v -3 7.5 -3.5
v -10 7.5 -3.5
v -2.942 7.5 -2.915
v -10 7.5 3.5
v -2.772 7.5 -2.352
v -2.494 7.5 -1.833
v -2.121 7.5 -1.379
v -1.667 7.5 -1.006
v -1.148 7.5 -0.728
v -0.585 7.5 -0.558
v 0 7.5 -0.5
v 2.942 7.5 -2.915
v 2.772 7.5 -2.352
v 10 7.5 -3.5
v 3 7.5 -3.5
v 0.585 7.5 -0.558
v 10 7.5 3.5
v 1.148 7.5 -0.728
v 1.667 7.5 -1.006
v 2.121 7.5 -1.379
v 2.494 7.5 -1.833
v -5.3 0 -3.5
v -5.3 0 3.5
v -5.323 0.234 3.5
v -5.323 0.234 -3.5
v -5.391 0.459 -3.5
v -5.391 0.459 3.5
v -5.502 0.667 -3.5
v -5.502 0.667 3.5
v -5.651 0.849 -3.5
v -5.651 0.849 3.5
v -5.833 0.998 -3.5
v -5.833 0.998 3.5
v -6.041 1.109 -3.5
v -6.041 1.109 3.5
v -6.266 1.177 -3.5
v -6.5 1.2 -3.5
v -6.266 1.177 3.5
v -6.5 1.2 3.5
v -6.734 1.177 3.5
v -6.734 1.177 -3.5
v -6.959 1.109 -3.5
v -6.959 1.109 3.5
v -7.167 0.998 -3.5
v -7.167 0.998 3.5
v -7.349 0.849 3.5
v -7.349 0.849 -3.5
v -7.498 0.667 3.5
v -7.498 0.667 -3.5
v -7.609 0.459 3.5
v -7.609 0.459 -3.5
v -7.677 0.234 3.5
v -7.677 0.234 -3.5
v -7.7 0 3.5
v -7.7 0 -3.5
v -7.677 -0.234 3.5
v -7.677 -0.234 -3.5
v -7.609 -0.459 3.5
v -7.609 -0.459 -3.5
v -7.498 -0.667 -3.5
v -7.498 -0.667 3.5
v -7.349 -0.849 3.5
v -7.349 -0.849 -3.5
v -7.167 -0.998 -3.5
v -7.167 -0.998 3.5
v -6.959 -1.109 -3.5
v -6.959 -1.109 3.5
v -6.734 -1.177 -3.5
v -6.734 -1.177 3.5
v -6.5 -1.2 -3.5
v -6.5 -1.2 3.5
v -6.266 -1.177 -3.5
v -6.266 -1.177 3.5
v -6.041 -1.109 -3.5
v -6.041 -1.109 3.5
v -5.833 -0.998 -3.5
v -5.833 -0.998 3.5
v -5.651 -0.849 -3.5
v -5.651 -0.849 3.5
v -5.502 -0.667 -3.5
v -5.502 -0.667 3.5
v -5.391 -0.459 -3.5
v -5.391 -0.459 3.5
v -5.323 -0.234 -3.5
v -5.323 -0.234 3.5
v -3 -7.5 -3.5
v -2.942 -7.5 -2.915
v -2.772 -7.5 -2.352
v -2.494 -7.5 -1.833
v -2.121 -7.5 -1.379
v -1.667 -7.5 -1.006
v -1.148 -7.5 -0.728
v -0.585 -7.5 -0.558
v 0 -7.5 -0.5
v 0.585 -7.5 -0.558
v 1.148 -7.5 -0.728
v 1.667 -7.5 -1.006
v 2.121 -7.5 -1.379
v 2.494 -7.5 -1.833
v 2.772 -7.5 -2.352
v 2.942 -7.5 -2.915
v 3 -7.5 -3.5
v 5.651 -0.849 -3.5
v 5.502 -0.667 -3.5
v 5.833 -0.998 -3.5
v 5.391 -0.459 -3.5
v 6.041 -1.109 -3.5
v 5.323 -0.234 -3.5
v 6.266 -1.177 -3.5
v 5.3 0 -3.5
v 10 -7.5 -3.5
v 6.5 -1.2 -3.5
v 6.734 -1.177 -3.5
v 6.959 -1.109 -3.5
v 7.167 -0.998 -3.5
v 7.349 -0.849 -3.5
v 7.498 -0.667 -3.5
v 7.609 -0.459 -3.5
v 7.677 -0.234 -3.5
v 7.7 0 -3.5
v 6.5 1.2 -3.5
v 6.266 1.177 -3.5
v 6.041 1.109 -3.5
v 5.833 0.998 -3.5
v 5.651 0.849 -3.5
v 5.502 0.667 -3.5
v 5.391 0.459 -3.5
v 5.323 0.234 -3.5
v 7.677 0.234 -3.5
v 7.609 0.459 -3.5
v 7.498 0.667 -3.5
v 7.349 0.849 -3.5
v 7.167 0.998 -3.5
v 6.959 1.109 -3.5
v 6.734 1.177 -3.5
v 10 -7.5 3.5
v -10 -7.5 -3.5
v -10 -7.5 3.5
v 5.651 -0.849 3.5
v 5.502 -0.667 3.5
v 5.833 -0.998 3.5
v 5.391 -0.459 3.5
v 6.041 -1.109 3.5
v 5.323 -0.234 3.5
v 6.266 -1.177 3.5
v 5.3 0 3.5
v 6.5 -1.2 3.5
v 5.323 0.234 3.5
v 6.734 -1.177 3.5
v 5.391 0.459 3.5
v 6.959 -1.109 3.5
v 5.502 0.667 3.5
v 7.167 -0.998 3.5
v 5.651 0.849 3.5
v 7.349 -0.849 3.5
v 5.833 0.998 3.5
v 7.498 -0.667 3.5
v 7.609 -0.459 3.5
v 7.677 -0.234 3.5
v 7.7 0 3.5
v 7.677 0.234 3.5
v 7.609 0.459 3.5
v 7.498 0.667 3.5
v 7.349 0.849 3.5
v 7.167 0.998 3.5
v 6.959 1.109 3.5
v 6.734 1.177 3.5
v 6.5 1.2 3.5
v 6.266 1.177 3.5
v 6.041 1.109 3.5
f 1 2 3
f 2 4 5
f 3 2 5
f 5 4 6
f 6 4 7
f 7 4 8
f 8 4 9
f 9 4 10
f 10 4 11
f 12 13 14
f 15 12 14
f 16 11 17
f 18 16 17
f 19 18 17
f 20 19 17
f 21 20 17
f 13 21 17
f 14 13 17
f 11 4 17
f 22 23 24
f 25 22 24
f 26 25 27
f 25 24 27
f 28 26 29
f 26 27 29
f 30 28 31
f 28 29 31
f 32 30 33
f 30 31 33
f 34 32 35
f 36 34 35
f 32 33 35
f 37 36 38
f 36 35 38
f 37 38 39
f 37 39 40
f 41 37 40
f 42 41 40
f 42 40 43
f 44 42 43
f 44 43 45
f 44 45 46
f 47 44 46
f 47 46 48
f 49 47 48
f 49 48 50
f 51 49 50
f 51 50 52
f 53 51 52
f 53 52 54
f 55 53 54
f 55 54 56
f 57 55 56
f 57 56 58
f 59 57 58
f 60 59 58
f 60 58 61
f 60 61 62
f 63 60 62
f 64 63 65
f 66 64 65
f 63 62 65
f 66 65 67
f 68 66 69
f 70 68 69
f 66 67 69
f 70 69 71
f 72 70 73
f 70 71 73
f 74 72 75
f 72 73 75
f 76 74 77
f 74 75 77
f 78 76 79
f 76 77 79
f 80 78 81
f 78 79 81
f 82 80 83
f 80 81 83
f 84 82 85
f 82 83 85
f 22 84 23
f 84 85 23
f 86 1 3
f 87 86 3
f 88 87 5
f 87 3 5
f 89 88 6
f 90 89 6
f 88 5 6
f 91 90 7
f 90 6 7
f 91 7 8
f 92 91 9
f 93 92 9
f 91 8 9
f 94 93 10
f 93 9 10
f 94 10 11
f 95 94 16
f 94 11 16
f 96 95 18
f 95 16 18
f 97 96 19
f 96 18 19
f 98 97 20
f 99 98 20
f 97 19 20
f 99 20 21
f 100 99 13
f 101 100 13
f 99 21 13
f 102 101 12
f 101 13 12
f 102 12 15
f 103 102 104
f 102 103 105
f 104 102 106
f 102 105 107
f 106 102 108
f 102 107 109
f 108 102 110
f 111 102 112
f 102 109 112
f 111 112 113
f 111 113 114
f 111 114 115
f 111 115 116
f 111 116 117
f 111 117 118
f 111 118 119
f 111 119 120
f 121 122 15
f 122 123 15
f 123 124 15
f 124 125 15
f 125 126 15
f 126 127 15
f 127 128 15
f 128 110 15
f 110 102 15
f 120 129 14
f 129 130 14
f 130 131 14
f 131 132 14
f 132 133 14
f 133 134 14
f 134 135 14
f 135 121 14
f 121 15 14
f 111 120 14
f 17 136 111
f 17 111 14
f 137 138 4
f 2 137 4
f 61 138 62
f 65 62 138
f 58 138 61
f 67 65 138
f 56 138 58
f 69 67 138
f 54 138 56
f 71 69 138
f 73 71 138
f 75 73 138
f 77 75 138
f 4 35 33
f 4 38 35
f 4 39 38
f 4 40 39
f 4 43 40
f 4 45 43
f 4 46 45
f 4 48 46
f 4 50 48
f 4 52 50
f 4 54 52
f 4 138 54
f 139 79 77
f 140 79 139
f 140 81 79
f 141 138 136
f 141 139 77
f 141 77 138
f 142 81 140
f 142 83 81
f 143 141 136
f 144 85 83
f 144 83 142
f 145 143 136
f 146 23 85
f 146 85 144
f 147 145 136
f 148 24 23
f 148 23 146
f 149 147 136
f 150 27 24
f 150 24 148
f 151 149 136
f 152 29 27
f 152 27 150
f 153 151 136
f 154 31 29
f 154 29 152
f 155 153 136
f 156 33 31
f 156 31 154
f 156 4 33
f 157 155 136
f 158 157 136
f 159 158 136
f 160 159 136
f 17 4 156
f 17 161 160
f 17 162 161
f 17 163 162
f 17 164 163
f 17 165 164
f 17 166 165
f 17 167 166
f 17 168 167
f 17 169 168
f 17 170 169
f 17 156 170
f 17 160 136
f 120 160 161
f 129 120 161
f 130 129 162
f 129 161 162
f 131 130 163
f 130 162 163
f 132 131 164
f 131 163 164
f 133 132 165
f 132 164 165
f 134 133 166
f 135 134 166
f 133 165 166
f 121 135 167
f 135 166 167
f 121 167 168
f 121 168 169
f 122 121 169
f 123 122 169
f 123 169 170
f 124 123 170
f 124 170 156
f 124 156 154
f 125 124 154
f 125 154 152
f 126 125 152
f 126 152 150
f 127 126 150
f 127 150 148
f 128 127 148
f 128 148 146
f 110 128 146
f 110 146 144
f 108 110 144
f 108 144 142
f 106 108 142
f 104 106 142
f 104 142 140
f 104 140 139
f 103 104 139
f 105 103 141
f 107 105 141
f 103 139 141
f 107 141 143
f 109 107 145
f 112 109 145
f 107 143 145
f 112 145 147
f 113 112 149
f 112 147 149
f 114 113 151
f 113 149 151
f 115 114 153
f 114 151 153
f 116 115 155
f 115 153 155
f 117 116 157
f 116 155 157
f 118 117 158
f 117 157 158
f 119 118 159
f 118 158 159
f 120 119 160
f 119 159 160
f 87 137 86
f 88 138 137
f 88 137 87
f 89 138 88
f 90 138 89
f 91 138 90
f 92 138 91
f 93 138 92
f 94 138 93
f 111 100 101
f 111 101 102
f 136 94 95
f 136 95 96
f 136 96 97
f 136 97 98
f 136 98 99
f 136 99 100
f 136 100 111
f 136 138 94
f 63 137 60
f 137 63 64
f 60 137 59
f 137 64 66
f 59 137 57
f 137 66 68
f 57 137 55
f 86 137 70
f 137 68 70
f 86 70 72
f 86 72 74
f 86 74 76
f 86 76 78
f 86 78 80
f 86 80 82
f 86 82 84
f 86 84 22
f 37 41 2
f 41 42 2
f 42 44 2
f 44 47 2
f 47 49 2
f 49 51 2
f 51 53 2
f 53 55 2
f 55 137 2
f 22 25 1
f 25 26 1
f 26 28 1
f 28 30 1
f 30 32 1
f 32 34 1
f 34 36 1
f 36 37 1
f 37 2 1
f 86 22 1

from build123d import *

# Parameters (mm, degrees)
SKETCH1_W          = 20
SKETCH1_H          = 15
EXTRUDE1_DEPTH     = 3.5
SKETCH2_R          = 3
CUT_EXTRUDE1_DEPTH = 16
SKETCH3_R          = 1.2
CUT_EXTRUDE2_DEPTH = 8


with BuildPart() as part:
    # Sketch1 → Extrude1 (new body, symmetric)
    with BuildSketch(Plane.XY):
        Rectangle(SKETCH1_W, SKETCH1_H)
    extrude(amount=EXTRUDE1_DEPTH, both=True)

    # Sketch2 → Cut-Extrude1 (cut, through all)
    with BuildSketch(Plane(origin=(0, 7.5, 0), x_dir=(-1, 0, 0), z_dir=(0, 1, 0))):
        with Locations((0, -3.5)):
            Circle(SKETCH2_R)
    extrude(amount=-CUT_EXTRUDE1_DEPTH, mode=Mode.SUBTRACT)

    # Sketch3 → Cut-Extrude2 (cut, through all)
    with BuildSketch(Plane.XY.offset(3.5)):
        with Locations((-6.5, 0)):
            Circle(SKETCH3_R)
        with Locations((6.5, 0)):
            Circle(SKETCH3_R)
    extrude(amount=-CUT_EXTRUDE2_DEPTH, mode=Mode.SUBTRACT)


solid = part.part
